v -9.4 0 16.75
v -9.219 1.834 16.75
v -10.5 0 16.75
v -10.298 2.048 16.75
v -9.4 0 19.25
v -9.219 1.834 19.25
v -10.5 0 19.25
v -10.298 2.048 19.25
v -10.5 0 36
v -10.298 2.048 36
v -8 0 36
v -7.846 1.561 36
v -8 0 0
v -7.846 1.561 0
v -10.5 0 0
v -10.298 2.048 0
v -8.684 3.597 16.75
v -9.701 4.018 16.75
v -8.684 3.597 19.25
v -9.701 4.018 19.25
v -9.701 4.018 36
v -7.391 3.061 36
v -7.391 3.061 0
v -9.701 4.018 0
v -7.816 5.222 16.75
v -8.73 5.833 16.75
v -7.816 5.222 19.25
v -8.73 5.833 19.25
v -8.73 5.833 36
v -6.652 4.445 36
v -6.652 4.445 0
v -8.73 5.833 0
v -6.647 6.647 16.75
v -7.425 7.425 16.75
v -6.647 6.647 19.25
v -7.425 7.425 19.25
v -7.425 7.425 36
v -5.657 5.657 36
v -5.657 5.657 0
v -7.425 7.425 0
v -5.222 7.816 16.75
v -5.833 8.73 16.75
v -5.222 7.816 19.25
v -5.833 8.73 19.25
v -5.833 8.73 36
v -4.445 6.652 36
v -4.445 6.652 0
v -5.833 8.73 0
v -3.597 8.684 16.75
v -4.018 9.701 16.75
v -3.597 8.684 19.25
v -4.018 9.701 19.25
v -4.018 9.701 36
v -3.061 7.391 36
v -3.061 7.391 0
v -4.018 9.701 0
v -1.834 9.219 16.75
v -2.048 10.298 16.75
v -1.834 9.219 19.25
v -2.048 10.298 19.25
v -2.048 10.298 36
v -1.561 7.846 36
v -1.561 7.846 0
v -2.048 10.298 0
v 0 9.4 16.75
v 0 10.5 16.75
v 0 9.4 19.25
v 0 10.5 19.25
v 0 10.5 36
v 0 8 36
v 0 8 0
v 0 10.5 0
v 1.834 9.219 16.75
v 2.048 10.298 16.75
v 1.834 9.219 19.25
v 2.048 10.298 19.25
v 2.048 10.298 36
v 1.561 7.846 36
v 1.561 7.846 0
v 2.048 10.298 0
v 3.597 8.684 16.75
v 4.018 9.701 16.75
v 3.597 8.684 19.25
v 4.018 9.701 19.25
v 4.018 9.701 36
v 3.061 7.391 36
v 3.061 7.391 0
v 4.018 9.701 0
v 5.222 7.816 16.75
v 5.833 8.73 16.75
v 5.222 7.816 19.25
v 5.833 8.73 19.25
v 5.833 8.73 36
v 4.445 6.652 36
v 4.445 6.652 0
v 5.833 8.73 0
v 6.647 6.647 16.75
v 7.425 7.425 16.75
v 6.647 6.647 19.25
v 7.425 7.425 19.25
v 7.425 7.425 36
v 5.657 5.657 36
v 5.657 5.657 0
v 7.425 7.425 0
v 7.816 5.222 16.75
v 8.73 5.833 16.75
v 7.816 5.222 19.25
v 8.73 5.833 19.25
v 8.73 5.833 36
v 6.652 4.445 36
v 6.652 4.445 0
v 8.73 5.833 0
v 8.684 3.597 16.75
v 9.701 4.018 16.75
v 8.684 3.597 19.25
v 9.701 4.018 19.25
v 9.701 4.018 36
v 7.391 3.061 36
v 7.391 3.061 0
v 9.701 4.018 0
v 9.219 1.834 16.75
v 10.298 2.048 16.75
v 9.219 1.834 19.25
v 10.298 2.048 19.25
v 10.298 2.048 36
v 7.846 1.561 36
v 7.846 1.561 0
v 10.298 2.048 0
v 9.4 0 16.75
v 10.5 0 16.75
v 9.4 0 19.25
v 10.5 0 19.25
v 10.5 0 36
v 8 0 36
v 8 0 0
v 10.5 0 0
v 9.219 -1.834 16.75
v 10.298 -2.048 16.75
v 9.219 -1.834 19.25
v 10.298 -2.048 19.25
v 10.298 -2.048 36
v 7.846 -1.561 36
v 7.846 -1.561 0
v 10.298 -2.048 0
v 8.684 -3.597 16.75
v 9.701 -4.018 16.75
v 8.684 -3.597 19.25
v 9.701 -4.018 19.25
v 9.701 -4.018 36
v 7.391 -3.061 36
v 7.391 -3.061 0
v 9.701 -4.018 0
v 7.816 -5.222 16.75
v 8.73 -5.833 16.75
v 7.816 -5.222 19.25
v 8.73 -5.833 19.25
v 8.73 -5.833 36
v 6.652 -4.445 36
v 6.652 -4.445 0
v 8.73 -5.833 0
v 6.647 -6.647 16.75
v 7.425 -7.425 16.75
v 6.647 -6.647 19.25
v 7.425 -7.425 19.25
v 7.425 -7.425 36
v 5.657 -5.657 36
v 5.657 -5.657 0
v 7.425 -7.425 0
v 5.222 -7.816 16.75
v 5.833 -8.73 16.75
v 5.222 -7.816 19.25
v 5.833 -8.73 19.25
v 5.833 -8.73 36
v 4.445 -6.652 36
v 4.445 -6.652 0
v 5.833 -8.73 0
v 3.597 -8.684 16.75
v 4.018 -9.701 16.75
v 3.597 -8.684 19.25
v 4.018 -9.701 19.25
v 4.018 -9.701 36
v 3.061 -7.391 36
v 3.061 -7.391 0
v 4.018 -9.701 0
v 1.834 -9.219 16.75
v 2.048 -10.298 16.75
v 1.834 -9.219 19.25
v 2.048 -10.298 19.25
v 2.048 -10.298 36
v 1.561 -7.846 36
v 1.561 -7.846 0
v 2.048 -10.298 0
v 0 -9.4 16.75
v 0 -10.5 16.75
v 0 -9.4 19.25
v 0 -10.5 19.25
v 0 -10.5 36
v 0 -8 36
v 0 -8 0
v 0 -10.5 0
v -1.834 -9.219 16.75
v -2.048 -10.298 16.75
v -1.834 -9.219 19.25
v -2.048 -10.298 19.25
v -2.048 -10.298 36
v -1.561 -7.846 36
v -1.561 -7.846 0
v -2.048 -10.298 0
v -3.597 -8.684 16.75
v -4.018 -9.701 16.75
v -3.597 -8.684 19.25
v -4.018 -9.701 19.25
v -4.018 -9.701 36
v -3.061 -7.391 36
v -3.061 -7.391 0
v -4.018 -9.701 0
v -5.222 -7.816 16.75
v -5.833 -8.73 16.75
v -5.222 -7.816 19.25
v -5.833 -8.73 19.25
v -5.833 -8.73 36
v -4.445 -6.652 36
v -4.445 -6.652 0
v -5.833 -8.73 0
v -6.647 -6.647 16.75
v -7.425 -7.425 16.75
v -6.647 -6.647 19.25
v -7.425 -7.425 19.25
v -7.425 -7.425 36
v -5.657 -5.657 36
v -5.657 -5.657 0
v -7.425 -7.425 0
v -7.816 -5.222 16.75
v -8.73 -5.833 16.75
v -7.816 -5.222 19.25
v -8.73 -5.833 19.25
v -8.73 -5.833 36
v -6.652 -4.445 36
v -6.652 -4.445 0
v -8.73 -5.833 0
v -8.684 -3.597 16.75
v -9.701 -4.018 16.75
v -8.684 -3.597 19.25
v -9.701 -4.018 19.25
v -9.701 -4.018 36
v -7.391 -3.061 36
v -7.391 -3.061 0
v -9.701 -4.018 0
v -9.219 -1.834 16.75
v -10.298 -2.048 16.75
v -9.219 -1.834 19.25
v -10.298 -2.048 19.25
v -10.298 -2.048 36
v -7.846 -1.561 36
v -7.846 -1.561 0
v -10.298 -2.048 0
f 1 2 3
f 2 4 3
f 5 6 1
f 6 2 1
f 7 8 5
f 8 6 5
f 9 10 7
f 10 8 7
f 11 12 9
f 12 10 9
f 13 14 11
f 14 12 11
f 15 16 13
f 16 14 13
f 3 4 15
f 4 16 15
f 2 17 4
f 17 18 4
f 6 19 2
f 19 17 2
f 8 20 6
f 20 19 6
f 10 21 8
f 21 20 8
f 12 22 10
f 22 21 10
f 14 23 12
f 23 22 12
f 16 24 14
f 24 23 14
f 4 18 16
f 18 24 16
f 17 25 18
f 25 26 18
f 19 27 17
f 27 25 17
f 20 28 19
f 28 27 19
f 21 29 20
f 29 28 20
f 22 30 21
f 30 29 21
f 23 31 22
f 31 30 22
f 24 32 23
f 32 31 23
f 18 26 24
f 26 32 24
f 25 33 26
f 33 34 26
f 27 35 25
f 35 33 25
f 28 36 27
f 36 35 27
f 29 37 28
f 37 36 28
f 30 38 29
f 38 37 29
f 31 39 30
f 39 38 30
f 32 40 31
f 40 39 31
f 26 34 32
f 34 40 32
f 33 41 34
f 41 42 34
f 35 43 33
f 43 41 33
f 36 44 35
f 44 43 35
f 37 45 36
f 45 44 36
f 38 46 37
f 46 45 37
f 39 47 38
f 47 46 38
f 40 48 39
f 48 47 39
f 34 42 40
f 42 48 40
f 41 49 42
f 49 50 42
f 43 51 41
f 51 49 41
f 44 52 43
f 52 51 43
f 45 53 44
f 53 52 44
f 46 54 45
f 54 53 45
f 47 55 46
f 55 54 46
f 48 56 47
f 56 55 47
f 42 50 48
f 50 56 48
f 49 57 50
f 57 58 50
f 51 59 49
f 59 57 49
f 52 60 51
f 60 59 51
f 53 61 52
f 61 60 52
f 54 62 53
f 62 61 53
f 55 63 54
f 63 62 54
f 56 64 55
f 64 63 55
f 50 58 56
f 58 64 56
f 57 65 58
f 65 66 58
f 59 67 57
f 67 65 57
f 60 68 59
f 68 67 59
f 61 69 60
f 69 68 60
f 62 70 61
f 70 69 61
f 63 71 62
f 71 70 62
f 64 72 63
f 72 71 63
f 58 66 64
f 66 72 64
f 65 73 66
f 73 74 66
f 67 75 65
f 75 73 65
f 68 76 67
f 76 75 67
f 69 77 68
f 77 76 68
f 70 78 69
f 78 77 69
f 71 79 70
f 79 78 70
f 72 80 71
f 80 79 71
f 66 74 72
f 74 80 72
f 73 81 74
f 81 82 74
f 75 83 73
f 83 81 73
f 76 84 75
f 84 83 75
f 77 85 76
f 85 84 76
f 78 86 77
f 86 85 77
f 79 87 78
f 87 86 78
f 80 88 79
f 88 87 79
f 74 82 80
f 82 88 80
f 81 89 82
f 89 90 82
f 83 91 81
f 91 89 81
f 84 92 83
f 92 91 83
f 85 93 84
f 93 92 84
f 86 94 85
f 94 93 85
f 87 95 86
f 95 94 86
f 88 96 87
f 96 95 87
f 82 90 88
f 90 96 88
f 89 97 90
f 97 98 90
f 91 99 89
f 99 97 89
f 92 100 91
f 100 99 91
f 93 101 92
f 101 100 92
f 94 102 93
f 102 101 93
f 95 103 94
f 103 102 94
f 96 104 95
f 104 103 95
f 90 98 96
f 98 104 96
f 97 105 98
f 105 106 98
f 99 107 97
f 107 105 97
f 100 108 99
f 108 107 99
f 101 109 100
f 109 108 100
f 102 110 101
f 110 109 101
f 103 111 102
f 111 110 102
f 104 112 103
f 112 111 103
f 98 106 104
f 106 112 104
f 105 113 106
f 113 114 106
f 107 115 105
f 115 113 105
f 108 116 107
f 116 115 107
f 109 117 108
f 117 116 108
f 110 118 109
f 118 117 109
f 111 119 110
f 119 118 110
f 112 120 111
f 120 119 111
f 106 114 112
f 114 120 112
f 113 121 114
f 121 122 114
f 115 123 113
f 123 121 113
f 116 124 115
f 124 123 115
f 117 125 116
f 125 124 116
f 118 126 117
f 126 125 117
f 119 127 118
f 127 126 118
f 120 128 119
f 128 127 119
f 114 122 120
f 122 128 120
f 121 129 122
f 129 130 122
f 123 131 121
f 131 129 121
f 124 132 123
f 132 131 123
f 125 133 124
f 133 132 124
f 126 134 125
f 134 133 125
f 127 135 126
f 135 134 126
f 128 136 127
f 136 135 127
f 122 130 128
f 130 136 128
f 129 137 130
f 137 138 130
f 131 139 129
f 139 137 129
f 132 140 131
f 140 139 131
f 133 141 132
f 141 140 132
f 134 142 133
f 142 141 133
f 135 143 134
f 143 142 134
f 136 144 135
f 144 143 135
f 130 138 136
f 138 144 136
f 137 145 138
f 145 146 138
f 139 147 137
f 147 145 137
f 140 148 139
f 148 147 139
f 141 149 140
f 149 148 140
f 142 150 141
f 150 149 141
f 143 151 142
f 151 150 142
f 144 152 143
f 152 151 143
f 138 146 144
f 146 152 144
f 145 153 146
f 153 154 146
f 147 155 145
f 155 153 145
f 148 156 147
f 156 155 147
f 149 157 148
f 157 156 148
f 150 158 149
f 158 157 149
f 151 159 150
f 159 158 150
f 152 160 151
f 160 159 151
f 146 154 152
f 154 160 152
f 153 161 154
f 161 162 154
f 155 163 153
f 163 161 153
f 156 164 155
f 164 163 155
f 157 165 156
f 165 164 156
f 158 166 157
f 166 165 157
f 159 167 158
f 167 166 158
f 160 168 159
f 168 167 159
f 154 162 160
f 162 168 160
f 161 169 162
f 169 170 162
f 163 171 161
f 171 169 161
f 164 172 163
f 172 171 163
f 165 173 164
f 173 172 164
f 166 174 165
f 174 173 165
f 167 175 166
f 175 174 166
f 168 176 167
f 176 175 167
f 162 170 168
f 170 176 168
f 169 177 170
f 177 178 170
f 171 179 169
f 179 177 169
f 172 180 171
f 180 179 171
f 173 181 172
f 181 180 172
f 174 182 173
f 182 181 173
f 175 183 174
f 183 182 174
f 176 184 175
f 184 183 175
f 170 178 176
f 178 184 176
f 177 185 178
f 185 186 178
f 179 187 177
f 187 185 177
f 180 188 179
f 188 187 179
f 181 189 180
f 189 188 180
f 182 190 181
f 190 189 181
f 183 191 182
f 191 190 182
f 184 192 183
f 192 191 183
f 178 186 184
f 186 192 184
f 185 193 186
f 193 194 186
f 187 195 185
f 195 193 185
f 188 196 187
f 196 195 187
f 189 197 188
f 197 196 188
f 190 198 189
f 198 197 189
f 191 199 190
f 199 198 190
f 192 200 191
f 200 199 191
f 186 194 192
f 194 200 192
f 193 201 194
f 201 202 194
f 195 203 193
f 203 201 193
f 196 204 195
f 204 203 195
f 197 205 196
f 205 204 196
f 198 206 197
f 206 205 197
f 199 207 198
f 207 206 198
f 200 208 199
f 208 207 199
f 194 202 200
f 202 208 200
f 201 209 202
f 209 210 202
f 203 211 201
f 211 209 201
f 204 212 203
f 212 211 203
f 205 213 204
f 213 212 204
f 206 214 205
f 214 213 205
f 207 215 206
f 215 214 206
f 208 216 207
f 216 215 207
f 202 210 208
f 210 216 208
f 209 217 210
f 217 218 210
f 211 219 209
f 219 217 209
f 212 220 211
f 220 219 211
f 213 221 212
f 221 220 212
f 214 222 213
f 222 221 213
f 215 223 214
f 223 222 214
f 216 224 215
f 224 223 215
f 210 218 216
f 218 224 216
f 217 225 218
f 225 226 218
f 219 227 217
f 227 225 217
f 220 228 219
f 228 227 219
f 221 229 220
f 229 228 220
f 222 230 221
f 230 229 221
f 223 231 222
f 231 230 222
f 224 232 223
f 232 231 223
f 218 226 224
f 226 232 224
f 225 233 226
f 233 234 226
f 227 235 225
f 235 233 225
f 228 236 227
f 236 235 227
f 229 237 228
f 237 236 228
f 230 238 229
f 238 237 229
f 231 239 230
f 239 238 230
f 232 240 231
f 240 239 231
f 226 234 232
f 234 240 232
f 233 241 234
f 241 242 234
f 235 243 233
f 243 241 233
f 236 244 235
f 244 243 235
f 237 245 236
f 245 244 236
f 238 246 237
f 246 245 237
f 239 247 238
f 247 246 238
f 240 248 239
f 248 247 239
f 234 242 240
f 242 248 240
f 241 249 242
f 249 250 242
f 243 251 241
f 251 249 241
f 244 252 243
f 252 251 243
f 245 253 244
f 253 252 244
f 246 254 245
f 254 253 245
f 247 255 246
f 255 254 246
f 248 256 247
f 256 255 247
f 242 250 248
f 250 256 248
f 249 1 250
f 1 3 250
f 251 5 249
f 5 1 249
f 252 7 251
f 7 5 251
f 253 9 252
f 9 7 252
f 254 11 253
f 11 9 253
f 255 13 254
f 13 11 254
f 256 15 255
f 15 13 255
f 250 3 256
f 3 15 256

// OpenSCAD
$fn = 32;

// ----------------------------------------------------------------------
// Grooved revolve: stepped, bore R8
// ----------------------------------------------------------------------

// --- parameters (mm) ---
bore_r = 8;               // bore radius
outer_r = 10.5;           // outer radius of the body
total_h = 36;             // overall height, Z
wall = 2.5;               // radial wall thickness
groove_w = 2.5;           // groove width
groove_d = 1.1;           // groove depth
grooves = 1;              // number of outer grooves

bbox_x = 2 * outer_r;  // full diameter
bore_d = 2 * bore_r;  // bore diameter
body_d = 2 * outer_r;  // body diameter
revolve_angle = 360;  // full turn around the Z axis

profile = [[8, 0], [10.5, 0], [10.5, 16.75], [9.4, 16.75], [9.4, 19.25], [10.5, 19.25], [10.5, 36], [8, 36]];  // primary outline, 8 points, counter clockwise

// --- the one profile operation ---
rotate_extrude(angle = revolve_angle) polygon(points = profile);
